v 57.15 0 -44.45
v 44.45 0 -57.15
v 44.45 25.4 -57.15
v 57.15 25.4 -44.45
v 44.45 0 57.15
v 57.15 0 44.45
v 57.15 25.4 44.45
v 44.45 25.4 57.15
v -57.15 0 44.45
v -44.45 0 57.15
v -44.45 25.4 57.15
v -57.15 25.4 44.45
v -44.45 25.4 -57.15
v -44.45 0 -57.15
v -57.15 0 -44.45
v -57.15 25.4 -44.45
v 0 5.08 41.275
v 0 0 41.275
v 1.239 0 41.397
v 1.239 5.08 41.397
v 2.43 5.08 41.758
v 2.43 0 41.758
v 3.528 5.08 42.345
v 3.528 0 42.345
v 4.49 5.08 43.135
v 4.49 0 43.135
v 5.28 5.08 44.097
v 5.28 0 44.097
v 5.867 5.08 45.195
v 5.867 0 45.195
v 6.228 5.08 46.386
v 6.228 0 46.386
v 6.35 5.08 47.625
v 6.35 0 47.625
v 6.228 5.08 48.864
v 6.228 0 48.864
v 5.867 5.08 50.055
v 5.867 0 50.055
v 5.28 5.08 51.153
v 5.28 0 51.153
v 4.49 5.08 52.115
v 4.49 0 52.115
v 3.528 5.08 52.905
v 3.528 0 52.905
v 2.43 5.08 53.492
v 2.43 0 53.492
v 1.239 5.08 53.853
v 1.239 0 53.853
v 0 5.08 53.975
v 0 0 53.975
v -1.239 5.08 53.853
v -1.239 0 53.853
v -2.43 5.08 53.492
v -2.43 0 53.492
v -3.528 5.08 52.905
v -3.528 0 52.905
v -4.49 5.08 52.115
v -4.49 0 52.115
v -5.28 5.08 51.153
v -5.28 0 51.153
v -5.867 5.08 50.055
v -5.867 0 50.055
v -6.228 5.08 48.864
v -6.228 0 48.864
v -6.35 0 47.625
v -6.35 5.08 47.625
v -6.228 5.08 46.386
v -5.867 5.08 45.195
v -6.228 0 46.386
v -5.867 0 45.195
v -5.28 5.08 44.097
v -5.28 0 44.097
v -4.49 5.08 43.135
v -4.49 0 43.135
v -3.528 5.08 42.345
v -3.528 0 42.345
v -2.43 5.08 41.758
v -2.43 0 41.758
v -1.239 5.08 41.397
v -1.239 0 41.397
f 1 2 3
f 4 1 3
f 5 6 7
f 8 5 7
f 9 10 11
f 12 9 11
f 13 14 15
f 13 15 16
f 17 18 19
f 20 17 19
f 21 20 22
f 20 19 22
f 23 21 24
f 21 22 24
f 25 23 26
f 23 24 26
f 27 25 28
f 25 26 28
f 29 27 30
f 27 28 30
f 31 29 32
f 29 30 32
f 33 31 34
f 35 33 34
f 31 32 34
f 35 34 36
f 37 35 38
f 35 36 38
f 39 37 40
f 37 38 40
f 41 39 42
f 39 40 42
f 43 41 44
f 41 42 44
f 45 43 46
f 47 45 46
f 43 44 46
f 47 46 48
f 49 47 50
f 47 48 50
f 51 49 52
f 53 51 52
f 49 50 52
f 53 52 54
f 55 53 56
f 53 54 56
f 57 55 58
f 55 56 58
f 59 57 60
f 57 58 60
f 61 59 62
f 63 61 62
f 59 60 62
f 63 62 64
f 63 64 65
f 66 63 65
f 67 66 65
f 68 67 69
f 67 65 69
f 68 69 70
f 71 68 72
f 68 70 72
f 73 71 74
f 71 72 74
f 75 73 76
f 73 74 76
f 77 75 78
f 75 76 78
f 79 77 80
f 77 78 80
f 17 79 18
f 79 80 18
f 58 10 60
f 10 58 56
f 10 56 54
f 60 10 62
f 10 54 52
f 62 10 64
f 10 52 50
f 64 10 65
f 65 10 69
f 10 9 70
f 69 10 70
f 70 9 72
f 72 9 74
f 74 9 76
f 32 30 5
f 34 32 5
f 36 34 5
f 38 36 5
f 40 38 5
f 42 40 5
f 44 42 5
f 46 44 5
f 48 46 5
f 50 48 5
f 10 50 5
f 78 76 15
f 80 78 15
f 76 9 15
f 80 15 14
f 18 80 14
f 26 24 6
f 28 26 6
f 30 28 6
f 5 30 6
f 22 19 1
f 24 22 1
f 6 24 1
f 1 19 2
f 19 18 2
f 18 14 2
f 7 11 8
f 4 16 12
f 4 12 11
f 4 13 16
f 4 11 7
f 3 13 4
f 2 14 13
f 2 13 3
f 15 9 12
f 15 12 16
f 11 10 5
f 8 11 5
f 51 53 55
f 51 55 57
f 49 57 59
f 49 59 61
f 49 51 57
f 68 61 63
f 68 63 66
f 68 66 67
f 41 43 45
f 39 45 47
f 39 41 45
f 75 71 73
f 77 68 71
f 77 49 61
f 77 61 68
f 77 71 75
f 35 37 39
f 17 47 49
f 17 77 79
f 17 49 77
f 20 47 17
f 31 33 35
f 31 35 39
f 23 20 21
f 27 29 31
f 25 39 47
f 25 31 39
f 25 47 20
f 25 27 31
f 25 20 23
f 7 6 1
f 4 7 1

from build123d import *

# Parameters (mm, degrees)
SKETCH1_W           = 114.3
SKETCH1_H           = 114.3
BOSS_EXTRUDE1_DEPTH = 25.4
CHAMFER1_SIZE       = 12.7
SKETCH2_R           = 6.35
CUT_EXTRUDE1_DEPTH  = 5.08


with BuildPart() as part:
    # Sketch1 → Boss-Extrude1 (new body)
    with BuildSketch(Plane(origin=(0, 0, 0), x_dir=(1, 0, 0), z_dir=(0, 1, 0))):
        Rectangle(SKETCH1_W, SKETCH1_H)
    extrude(amount=BOSS_EXTRUDE1_DEPTH)

    # Chamfer1
    chamfer1_edges = [part.edges().sort_by_distance(p)[0] for p in [
        (57.15, 12.7, 57.15),
        (-57.15, 12.7, 57.15),
        (-57.15, 12.7, -57.15),
        (57.15, 12.7, -57.15),
    ]]
    chamfer(chamfer1_edges, length=CHAMFER1_SIZE)

    # Sketch2 → Cut-Extrude1 (cut)
    with BuildSketch(Plane(origin=(0, 0, 0), x_dir=(-1, 0, 0), z_dir=(0, -1, 0))):
        with Locations(Location((0, -47.625, 0), (0, 0, 90))):
            Circle(SKETCH2_R)
    extrude(amount=-CUT_EXTRUDE1_DEPTH, mode=Mode.SUBTRACT)


solid = part.part
